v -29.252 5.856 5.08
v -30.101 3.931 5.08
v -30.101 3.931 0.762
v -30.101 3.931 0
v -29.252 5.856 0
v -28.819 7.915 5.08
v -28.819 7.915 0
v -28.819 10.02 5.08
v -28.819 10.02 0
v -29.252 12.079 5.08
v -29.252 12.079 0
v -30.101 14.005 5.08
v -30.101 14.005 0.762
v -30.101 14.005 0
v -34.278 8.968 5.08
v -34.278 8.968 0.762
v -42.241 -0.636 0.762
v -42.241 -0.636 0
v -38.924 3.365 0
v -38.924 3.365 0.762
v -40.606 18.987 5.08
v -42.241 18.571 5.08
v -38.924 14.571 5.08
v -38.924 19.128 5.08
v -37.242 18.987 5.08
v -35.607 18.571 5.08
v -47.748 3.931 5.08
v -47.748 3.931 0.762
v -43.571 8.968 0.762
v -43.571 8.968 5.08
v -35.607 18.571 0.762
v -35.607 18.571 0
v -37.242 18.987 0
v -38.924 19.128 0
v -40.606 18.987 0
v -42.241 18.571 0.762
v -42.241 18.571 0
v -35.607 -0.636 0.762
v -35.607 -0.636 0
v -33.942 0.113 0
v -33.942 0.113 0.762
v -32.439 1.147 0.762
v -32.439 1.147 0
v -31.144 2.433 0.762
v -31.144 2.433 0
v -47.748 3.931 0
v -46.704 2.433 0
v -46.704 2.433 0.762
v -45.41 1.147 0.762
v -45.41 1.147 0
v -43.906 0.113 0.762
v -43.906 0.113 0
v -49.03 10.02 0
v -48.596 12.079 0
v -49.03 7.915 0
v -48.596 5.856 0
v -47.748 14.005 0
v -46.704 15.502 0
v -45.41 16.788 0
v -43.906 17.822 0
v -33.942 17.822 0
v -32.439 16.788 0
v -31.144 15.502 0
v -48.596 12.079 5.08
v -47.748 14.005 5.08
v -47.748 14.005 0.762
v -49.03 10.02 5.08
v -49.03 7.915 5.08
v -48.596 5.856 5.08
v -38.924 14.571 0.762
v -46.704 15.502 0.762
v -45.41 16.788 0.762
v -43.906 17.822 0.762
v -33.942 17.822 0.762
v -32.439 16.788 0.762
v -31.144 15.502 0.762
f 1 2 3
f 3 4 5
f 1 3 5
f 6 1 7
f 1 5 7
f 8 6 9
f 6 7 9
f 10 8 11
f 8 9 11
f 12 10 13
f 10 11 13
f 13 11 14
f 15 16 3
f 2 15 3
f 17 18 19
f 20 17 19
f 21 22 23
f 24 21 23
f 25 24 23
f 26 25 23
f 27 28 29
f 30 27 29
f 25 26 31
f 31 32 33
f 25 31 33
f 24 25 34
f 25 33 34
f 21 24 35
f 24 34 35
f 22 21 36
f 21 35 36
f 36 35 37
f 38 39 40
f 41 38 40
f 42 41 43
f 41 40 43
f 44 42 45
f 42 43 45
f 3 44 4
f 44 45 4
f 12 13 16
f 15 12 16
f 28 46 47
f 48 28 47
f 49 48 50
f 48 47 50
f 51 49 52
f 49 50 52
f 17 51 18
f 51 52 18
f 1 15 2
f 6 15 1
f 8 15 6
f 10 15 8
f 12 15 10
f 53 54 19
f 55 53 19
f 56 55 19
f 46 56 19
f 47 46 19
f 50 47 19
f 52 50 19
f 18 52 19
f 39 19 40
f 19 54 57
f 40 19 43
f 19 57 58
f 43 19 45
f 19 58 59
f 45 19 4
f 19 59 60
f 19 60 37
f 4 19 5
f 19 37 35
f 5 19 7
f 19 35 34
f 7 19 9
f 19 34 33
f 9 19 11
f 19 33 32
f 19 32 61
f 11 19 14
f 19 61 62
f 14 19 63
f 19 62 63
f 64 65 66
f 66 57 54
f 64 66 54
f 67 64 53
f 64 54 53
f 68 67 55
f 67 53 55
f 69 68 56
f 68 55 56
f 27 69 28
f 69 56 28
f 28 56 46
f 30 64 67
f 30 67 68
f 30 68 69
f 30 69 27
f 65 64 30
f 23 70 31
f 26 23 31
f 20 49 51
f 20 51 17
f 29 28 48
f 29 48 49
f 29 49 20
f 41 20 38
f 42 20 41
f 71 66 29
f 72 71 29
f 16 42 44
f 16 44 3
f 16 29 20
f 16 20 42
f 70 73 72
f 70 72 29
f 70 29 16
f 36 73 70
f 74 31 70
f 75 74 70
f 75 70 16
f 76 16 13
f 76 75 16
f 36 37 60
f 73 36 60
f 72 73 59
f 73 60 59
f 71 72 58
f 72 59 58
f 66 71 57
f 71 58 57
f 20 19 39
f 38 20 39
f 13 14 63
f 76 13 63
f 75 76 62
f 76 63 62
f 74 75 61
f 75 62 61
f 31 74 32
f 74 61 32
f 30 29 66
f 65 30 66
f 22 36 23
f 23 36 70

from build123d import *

# Parameters (mm, degrees)
F1_DEPTH = 0.762
F2_DEPTH = 5.08


with BuildPart() as f1:
    # F0 (on Top) → F1 (new body)
    with BuildSketch(Plane.XY):
        with BuildLine():
            ThreePointArc((-42.241485, 18.570835), (-45.409698, 16.788386), (-47.747653, 14.004744))
            Line((-47.747653, 14.004744), (-43.570547, 8.967645))
            Line((-43.570547, 8.967645), (-47.747653, 3.930546))
            ThreePointArc((-47.747653, 3.930546), (-45.409698, 1.146904), (-42.241485, -0.635545))
            Line((-42.241485, -0.635545), (-38.924205, 3.364703))
            Line((-38.924205, 3.364703), (-35.606926, -0.635545))
            ThreePointArc((-35.606926, -0.635545), (-32.438713, 1.146904), (-30.100758, 3.930546))
            Line((-30.100758, 3.930546), (-34.277864, 8.967645))
            Line((-34.277864, 8.967645), (-30.100758, 14.004744))
            ThreePointArc((-30.100758, 14.004744), (-32.438713, 16.788386), (-35.606926, 18.570835))
            Line((-35.606926, 18.570835), (-38.924205, 14.570586))
            Line((-38.924205, 14.570586), (-42.241485, 18.570835))
        make_face()
    extrude(amount=F1_DEPTH)

    # F0 (on Top) → F2 (join)
    with BuildSketch(Plane.XY):
        with BuildLine():
            ThreePointArc((-35.606926, 18.570835), (-38.924205, 19.127645), (-42.241485, 18.570835))
            Line((-42.241485, 18.570835), (-38.924205, 14.570586))
            Line((-38.924205, 14.570586), (-35.606926, 18.570835))
        make_face()
        with BuildLine():
            ThreePointArc((-30.100758, 3.930546), (-28.764205, 8.967645), (-30.100758, 14.004744))
            Line((-30.100758, 14.004744), (-34.277864, 8.967645))
            Line((-34.277864, 8.967645), (-30.100758, 3.930546))
        make_face()
        with BuildLine():
            Line((-43.570547, 8.967645), (-47.747653, 14.004744))
            ThreePointArc((-47.747653, 14.004744), (-49.084205, 8.967645), (-47.747653, 3.930546))
            Line((-47.747653, 3.930546), (-43.570547, 8.967645))
        make_face()
    extrude(amount=F2_DEPTH)


solid = f1.part
